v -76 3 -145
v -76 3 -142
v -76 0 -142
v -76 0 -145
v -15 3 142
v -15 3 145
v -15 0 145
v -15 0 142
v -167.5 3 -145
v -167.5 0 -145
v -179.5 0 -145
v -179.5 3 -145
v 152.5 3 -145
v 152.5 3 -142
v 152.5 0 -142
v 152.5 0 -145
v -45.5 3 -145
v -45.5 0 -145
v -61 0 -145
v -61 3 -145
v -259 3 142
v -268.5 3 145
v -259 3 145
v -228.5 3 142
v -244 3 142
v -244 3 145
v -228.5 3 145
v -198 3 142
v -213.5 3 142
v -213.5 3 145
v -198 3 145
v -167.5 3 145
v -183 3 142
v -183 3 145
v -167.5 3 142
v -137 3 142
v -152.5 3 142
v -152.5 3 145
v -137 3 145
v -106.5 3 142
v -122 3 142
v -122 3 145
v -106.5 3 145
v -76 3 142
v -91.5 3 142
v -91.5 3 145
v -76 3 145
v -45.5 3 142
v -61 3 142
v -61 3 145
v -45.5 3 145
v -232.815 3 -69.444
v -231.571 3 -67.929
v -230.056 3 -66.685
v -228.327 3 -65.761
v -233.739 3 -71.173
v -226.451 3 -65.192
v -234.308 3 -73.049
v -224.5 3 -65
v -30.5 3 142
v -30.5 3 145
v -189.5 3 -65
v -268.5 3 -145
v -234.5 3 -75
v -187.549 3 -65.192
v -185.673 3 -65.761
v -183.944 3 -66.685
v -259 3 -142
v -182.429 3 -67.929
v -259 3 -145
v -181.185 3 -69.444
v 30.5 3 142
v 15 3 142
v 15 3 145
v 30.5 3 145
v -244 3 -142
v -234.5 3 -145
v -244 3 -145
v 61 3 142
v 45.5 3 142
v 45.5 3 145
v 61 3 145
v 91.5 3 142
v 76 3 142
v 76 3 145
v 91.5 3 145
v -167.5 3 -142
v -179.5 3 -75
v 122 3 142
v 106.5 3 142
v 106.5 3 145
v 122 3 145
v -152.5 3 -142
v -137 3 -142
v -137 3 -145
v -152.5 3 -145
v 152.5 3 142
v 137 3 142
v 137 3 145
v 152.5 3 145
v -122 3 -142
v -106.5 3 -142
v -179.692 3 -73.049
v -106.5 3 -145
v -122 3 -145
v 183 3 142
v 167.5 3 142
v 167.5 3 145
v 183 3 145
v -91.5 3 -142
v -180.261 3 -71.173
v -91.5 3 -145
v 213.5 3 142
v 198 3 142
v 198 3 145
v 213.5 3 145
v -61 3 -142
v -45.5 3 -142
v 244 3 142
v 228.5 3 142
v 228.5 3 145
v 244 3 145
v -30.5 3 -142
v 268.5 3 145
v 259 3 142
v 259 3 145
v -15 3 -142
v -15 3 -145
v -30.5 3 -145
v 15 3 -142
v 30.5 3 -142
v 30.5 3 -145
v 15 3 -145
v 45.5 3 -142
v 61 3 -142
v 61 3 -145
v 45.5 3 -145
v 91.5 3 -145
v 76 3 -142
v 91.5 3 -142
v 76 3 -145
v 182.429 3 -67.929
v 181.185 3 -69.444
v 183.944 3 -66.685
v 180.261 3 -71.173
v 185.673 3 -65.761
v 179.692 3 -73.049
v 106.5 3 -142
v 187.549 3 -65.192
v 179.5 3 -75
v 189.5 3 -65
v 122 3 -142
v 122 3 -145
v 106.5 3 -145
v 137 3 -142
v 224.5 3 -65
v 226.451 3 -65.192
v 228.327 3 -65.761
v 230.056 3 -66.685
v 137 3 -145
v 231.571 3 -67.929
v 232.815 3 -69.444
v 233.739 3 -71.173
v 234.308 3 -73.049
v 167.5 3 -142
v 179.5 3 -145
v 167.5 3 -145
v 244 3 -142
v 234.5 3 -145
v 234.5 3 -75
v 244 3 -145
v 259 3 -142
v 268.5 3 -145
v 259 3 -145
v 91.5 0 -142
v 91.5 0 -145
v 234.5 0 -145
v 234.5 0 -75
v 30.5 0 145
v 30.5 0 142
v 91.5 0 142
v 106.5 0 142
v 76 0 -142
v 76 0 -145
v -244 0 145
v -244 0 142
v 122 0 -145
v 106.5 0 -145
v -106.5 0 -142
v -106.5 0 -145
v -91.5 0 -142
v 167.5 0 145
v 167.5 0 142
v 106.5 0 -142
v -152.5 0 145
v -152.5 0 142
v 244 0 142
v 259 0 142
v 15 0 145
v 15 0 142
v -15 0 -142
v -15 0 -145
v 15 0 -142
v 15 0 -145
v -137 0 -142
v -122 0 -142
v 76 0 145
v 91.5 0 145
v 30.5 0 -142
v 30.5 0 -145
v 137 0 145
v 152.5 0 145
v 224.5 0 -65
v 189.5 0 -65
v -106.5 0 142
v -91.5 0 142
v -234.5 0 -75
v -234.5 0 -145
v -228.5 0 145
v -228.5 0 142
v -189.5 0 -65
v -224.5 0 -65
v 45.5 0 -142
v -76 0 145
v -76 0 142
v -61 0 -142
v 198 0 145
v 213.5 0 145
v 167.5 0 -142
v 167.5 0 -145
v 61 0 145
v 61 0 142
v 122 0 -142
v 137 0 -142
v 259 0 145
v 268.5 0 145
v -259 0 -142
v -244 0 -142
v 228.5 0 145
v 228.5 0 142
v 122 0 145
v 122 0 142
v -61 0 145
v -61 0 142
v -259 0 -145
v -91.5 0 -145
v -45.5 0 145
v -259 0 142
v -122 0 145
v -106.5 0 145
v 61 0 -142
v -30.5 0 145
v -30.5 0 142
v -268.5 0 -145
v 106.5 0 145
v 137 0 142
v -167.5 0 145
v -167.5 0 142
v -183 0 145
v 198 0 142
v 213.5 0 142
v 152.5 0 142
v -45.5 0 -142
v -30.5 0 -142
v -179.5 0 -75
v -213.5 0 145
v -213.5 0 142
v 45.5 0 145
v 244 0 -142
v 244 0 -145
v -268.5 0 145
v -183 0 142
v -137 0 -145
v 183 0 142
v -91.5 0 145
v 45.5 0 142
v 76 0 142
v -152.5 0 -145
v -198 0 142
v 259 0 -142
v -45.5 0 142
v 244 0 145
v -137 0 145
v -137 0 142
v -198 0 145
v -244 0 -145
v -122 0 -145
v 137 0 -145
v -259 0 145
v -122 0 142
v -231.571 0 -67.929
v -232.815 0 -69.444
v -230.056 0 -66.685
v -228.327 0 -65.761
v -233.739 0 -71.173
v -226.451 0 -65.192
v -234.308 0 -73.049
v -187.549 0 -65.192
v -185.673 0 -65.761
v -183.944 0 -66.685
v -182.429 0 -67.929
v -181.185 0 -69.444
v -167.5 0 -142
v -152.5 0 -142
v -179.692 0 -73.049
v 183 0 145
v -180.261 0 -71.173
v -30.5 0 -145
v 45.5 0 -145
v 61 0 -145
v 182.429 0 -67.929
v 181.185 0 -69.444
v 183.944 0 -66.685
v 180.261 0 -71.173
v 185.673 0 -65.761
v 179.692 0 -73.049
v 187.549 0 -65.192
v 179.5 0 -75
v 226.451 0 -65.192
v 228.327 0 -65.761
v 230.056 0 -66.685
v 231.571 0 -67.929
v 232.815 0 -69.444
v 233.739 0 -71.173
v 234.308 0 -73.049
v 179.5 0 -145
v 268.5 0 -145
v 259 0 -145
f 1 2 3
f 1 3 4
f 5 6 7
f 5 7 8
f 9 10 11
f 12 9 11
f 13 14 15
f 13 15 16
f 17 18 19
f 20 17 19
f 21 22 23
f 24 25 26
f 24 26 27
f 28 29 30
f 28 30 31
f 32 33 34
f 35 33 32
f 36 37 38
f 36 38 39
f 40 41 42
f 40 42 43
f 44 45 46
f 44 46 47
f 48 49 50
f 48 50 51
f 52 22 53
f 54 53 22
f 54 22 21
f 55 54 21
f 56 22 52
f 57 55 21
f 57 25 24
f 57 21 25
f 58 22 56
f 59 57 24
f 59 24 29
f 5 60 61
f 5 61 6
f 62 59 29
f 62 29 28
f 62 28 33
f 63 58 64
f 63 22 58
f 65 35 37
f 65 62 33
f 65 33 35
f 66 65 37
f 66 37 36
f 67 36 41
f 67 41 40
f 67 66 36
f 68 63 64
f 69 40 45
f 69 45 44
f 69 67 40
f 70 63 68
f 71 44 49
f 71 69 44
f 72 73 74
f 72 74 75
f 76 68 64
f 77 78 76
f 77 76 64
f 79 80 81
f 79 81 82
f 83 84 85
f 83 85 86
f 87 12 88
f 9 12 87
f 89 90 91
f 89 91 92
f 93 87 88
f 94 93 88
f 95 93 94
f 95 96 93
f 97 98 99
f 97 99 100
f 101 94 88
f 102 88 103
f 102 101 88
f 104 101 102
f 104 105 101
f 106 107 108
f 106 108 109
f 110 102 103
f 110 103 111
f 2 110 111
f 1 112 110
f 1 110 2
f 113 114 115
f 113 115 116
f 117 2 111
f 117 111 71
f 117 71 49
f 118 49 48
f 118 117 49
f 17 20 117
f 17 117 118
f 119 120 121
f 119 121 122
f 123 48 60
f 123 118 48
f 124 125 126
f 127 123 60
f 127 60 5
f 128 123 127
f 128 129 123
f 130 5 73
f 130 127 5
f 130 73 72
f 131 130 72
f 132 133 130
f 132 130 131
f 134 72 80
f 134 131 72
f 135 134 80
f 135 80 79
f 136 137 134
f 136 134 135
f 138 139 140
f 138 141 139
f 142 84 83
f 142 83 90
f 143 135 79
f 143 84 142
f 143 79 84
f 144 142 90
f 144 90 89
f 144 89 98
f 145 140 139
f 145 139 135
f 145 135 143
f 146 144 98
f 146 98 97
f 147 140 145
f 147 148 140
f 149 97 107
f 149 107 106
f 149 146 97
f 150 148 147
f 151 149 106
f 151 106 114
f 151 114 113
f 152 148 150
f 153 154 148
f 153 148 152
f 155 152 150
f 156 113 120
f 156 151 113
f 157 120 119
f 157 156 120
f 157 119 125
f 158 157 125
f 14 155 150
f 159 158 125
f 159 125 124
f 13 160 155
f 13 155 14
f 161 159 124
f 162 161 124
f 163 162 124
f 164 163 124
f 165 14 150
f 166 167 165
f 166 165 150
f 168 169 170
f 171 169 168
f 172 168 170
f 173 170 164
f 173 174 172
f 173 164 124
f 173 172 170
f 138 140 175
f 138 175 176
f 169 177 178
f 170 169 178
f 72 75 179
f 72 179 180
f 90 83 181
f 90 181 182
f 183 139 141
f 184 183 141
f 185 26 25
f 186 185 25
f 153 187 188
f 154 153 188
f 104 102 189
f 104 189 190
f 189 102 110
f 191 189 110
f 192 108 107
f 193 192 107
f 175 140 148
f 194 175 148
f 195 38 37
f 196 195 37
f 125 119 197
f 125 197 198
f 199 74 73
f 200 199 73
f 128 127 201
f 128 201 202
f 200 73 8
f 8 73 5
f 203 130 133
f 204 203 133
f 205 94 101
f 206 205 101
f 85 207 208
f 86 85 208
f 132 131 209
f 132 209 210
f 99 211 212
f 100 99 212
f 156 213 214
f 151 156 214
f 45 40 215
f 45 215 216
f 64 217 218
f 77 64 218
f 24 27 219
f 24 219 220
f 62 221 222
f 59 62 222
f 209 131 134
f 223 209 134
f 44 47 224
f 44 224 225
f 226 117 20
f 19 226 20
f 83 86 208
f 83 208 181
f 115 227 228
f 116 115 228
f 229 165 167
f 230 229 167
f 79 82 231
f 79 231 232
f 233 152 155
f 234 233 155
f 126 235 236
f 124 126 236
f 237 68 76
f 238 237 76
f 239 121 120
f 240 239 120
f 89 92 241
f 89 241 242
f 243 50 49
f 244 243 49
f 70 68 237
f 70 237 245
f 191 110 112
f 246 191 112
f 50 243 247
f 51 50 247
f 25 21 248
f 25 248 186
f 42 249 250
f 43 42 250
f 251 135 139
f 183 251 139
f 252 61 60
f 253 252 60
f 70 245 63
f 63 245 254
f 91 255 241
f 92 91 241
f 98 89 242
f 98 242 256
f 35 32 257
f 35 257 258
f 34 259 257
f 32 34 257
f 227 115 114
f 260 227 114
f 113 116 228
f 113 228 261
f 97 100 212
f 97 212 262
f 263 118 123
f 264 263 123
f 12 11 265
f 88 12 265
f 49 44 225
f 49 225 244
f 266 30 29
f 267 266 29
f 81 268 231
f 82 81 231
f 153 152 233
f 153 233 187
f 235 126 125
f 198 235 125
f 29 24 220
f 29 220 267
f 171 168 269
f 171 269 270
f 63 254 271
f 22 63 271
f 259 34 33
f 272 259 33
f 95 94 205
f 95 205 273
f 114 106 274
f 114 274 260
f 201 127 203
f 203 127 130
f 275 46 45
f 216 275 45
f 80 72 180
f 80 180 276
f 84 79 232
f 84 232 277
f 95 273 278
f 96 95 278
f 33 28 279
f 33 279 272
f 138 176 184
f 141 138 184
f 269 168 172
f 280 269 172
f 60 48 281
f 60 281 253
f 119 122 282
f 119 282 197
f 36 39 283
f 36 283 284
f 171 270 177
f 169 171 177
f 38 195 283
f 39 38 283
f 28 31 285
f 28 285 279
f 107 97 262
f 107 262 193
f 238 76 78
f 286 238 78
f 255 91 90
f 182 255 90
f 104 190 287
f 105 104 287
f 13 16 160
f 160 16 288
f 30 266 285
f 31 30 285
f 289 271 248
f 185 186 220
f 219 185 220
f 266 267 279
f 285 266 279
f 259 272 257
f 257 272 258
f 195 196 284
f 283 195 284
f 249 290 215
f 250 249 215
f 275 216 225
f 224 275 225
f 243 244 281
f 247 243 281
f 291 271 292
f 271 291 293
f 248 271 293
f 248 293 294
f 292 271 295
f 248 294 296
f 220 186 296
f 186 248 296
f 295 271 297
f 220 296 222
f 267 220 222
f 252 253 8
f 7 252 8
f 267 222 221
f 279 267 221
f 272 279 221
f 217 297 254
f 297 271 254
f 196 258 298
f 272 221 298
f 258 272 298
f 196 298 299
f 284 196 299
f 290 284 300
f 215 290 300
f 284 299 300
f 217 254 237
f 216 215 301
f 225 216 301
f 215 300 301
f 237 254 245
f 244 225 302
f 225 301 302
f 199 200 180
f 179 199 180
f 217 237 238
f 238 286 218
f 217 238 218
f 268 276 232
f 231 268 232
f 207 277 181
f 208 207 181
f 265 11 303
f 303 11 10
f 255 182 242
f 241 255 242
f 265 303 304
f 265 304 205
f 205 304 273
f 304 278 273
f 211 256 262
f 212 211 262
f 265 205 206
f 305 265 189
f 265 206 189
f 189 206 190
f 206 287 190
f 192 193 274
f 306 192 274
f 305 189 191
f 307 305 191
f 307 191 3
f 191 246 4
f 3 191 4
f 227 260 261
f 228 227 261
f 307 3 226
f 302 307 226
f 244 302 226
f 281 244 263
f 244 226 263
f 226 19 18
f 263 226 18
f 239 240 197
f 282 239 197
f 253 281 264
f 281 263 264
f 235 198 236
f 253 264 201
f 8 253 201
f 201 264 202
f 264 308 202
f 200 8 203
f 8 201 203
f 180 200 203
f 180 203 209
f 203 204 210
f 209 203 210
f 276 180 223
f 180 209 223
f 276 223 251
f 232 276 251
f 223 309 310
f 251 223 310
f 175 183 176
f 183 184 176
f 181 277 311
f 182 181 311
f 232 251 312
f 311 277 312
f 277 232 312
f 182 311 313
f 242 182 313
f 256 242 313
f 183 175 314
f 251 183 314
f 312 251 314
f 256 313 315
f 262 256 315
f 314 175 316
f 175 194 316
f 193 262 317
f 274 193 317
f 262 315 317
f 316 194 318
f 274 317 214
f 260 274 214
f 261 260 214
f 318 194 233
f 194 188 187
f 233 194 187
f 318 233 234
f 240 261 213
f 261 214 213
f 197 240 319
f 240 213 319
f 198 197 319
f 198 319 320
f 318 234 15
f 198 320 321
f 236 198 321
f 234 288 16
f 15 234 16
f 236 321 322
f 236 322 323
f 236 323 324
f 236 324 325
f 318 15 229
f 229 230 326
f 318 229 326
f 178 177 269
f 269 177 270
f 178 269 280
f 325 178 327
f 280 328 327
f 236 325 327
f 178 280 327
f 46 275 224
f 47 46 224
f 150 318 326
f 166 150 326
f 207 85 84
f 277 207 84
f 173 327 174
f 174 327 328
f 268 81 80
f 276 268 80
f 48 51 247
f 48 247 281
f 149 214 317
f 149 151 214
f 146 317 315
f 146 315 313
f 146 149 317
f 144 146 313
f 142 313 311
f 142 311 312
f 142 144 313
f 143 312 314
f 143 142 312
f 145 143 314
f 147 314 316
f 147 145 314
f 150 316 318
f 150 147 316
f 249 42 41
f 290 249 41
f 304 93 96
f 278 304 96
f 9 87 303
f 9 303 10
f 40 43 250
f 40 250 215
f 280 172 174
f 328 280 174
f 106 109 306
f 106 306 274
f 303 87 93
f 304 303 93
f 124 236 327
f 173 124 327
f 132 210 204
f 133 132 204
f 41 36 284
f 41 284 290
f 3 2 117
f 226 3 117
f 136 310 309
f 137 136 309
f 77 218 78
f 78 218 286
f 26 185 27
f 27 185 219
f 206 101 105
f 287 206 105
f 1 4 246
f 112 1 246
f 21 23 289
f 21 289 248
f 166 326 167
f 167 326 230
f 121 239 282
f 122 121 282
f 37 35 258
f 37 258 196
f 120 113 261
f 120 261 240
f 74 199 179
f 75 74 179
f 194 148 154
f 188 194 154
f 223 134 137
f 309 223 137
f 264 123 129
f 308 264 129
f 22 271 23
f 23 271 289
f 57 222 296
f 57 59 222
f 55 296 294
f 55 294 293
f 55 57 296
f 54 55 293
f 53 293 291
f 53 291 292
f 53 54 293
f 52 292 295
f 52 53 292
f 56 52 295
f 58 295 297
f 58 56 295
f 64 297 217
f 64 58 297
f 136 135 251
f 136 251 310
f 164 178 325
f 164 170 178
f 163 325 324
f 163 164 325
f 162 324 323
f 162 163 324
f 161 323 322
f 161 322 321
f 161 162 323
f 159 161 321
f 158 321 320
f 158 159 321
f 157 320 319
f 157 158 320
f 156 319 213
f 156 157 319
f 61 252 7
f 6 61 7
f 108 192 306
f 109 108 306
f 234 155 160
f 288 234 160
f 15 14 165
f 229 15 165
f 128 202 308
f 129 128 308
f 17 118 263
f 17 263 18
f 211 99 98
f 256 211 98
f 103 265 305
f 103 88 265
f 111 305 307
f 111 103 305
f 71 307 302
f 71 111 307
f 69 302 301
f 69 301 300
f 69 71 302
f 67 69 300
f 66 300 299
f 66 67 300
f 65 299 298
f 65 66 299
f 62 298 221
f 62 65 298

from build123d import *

# Parameters (mm, degrees)
BOSS_EXTRUDE1_DEPTH = 3
FILLET1_R           = 10
SKETCH2_W           = 15
SKETCH2_H           = 3
CUT_EXTRUDE2_DEPTH  = 306.165938466


with BuildPart() as part:
    # Sketch1 → Boss-Extrude1 (new body)
    with BuildSketch(Plane(origin=(0, 0, 0), x_dir=(1, 0, 0), z_dir=(0, 1, 0))):
        Polygon((-234.5, 145), (-268.5, 145), (-268.5, -145), (268.5, -145), (268.5, 145), (234.5, 145), (234.5, 65), (179.5, 65), (179.5, 145), (-179.5, 145), (-179.5, 65), (-234.5, 65), align=None)
    extrude(amount=BOSS_EXTRUDE1_DEPTH)

    # Fillet1
    fillet1_edges = [part.edges().sort_by_distance(p)[0] for p in [
        (-234.5, 1.5, -65),
        (-179.5, 1.5, -65),
        (179.5, 1.5, -65),
        (234.5, 1.5, -65),
    ]]
    fillet(fillet1_edges, radius=FILLET1_R)

    # Sketch2 → Cut-Extrude2 (cut, through all)
    with BuildSketch(Plane(origin=(0, 3, 0), x_dir=(1, 0, 0), z_dir=(0, 1, 0))):
        with Locations((-251.5, 143.5)):
            Rectangle(SKETCH2_W, SKETCH2_H)
        with Locations((-221, 143.5)):
            Rectangle(SKETCH2_W, SKETCH2_H)
        with Locations((-190.5, 143.5)):
            Rectangle(SKETCH2_W, SKETCH2_H)
        with Locations((-160, 143.5)):
            Rectangle(SKETCH2_W, SKETCH2_H)
        with Locations((-129.5, 143.5)):
            Rectangle(SKETCH2_W, SKETCH2_H)
        with Locations((-99, 143.5)):
            Rectangle(SKETCH2_W, SKETCH2_H)
        with Locations((-68.5, 143.5)):
            Rectangle(SKETCH2_W, SKETCH2_H)
        with Locations((-38, 143.5)):
            Rectangle(SKETCH2_W, SKETCH2_H)
        with Locations((-7.5, 143.5)):
            Rectangle(SKETCH2_W, SKETCH2_H)
        with Locations((7.5, 143.5)):
            Rectangle(SKETCH2_W, SKETCH2_H)
        with Locations((38, 143.5)):
            Rectangle(SKETCH2_W, SKETCH2_H)
        with Locations((68.5, 143.5)):
            Rectangle(SKETCH2_W, SKETCH2_H)
        with Locations((99, 143.5)):
            Rectangle(SKETCH2_W, SKETCH2_H)
        with Locations((129.5, 143.5)):
            Rectangle(SKETCH2_W, SKETCH2_H)
        with Locations((160, 143.5)):
            Rectangle(SKETCH2_W, SKETCH2_H)
        with Locations((190.5, 143.5)):
            Rectangle(SKETCH2_W, SKETCH2_H)
        with Locations((221, 143.5)):
            Rectangle(SKETCH2_W, SKETCH2_H)
        with Locations((251.5, 143.5)):
            Rectangle(SKETCH2_W, SKETCH2_H)
        with Locations((-251.5, -143.5)):
            Rectangle(SKETCH2_W, SKETCH2_H)
        with Locations((-221, -143.5)):
            Rectangle(SKETCH2_W, SKETCH2_H)
        with Locations((-190.5, -143.5)):
            Rectangle(SKETCH2_W, SKETCH2_H)
        with Locations((-160, -143.5)):
            Rectangle(SKETCH2_W, SKETCH2_H)
        with Locations((-129.5, -143.5)):
            Rectangle(SKETCH2_W, SKETCH2_H)
        with Locations((-99, -143.5)):
            Rectangle(SKETCH2_W, SKETCH2_H)
        with Locations((-68.5, -143.5)):
            Rectangle(SKETCH2_W, SKETCH2_H)
        with Locations((-38, -143.5)):
            Rectangle(SKETCH2_W, SKETCH2_H)
        with Locations((-7.5, -143.5)):
            Rectangle(SKETCH2_W, SKETCH2_H)
        with Locations((7.5, -143.5)):
            Rectangle(SKETCH2_W, SKETCH2_H)
        with Locations((38, -143.5)):
            Rectangle(SKETCH2_W, SKETCH2_H)
        with Locations((68.5, -143.5)):
            Rectangle(SKETCH2_W, SKETCH2_H)
        with Locations((99, -143.5)):
            Rectangle(SKETCH2_W, SKETCH2_H)
        with Locations((129.5, -143.5)):
            Rectangle(SKETCH2_W, SKETCH2_H)
        with Locations((160, -143.5)):
            Rectangle(SKETCH2_W, SKETCH2_H)
        with Locations((190.5, -143.5)):
            Rectangle(SKETCH2_W, SKETCH2_H)
        with Locations((221, -143.5)):
            Rectangle(SKETCH2_W, SKETCH2_H)
        with Locations((251.5, -143.5)):
            Rectangle(SKETCH2_W, SKETCH2_H)
    extrude(amount=-CUT_EXTRUDE2_DEPTH, mode=Mode.SUBTRACT)


solid = part.part
